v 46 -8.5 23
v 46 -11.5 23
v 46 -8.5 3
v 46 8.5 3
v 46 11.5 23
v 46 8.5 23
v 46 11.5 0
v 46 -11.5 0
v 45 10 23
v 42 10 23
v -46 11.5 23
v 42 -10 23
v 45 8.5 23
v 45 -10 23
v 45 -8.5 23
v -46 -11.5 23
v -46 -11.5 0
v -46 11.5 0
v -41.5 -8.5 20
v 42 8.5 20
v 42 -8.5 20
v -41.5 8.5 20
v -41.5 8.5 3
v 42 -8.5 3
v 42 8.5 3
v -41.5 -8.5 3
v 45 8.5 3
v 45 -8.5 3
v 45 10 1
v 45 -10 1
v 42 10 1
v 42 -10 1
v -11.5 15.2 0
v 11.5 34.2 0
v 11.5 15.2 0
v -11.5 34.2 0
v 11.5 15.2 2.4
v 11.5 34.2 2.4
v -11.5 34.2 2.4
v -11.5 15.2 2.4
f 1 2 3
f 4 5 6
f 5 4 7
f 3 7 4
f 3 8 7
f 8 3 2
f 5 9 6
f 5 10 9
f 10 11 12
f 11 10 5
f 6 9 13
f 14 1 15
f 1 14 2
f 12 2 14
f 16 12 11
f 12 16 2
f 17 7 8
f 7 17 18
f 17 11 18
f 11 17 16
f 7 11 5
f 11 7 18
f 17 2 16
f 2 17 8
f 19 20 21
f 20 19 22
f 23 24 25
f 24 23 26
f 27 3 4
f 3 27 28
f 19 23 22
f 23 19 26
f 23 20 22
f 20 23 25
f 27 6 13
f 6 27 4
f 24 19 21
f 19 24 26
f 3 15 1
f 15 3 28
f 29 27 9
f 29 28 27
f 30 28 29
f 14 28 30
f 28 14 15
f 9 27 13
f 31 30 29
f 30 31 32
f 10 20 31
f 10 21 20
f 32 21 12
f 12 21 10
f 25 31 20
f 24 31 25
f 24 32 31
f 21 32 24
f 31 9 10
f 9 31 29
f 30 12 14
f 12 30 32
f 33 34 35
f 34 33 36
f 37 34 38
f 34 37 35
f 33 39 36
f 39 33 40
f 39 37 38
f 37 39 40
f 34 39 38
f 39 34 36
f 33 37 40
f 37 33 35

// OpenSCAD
NUMBER_OF_DICE = 5;
DIE_WIDTH = 15;
TOLERANCE = 1;
WALL_THICKNESS = 3;

door_lip = 1;

inner_length = (NUMBER_OF_DICE * DIE_WIDTH) 
             + (TOLERANCE * NUMBER_OF_DICE * 2)
             + (WALL_THICKNESS + door_lip);
inner_width = DIE_WIDTH + (TOLERANCE * 2);

outer_width = inner_width + (WALL_THICKNESS * 2);
outer_length = inner_length + WALL_THICKNESS;

door_width = inner_width + WALL_THICKNESS;

module container() {
    difference() {
        cube([outer_length, outer_width, outer_width], center=true);
        translate([(outer_length - inner_length), 0, 0])
        cube([inner_length, inner_width, inner_width], center=true);
    }
}

module door() {
    cube([WALL_THICKNESS, door_width, outer_width], center=true);
}

vertical_offset = outer_width / 2;

translate([0, 0, vertical_offset])
difference() {
    container();
    translate([(inner_length / 2 - door_lip), 0, (WALL_THICKNESS / 3)])
    door();
    translate([(inner_length / 2), 0, (outer_width / 2)])
    cube([WALL_THICKNESS, inner_width, (WALL_THICKNESS * 2)], center=true);
}

scale([1, 0.95, 0.8])
rotate([0, 90, 0])
translate([-(WALL_THICKNESS / 2), outer_width + WALL_THICKNESS, 0])
door();
